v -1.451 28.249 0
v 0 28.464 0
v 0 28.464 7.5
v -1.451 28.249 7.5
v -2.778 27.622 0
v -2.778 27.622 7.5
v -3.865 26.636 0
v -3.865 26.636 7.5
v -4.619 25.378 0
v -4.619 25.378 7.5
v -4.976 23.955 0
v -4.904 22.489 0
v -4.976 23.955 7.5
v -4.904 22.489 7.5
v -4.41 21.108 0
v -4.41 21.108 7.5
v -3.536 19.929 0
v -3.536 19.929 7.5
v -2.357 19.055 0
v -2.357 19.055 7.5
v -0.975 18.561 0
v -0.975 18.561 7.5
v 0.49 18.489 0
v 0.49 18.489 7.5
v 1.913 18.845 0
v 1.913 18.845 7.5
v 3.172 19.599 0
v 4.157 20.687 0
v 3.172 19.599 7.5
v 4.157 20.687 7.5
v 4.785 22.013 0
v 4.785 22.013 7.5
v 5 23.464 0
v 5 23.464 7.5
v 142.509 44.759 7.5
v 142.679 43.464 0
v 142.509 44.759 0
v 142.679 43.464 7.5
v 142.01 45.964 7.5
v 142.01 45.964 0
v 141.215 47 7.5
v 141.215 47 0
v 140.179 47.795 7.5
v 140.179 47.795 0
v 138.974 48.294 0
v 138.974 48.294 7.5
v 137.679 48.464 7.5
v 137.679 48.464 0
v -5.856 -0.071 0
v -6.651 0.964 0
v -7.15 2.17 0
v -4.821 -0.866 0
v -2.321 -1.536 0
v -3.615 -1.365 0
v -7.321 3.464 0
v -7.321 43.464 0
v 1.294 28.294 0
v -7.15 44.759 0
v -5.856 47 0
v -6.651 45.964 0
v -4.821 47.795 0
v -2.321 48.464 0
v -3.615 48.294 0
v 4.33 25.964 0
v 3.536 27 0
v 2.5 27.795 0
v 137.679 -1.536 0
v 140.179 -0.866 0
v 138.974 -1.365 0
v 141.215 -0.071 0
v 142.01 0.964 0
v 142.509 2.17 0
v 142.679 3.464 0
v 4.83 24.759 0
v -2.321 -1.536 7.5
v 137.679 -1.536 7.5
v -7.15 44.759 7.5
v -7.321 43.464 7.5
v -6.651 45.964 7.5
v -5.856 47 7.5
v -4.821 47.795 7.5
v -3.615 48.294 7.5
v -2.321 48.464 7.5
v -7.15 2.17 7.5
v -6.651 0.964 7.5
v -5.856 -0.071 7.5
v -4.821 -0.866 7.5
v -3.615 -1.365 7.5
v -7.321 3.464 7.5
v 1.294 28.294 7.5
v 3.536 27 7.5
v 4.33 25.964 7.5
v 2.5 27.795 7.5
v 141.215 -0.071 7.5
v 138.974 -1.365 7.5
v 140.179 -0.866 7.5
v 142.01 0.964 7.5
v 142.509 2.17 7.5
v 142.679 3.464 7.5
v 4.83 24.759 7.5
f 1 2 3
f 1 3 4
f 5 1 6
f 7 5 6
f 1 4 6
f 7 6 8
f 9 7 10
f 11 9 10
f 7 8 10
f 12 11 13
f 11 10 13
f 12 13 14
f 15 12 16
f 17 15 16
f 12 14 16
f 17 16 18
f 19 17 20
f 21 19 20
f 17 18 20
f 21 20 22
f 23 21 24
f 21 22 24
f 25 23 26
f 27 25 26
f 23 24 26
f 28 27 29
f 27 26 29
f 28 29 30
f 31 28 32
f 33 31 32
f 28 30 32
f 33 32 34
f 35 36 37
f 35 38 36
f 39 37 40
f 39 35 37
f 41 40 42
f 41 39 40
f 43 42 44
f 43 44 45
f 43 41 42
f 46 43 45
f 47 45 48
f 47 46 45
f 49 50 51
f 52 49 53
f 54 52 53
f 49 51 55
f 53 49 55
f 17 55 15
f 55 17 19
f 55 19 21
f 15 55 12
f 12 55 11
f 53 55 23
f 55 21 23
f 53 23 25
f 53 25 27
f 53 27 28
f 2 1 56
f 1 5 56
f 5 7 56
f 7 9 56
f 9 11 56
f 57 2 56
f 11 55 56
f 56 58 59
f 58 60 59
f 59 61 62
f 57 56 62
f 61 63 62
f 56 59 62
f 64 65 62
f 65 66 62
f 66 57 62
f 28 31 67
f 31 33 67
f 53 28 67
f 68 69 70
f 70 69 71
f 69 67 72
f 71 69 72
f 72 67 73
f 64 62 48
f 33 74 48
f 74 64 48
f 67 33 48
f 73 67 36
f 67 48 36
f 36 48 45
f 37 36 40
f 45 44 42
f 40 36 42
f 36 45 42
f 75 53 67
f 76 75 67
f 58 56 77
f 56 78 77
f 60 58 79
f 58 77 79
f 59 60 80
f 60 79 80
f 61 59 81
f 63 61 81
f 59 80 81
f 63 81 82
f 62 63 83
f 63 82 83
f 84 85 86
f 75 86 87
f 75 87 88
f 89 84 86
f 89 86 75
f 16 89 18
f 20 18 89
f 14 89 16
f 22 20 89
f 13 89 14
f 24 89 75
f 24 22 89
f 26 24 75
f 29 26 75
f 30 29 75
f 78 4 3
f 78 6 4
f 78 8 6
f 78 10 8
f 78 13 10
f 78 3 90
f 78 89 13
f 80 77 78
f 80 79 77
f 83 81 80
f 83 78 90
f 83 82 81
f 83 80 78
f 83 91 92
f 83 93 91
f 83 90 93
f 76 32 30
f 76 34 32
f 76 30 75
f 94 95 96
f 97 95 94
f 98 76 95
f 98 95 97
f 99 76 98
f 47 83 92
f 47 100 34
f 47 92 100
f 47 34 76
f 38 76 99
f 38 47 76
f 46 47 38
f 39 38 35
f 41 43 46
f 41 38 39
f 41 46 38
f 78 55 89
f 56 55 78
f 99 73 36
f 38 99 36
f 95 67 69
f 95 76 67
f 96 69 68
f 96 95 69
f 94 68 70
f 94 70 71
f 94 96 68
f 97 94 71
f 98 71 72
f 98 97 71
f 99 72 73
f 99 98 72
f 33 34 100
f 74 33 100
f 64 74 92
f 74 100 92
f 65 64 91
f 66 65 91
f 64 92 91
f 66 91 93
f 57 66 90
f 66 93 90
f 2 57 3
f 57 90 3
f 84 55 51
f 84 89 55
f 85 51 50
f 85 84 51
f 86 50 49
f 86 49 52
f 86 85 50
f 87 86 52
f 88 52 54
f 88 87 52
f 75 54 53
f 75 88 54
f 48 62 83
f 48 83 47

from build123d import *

# Parameters (mm, degrees)
F0_W     = 150
F0_H     = 50
F1_DEPTH = 7.5
F2_R     = 5
F3_R     = 5
F4_R     = 5
F5_R     = 5
F7_DEPTH = 25


with BuildPart() as f1:
    # F0 (on Top) → F1 (new body)
    with BuildSketch(Plane.XY):
        with Locations((67.679448, 23.464493)):
            Rectangle(F0_W, F0_H)
    extrude(amount=F1_DEPTH)

    # F2
    f2_edges = [f1.edges().sort_by_distance(p)[0] for p in [
        (-7.320552, -1.535507, 3.75),
    ]]
    fillet(f2_edges, radius=F2_R)

    # F3
    f3_edges = [f1.edges().sort_by_distance(p)[0] for p in [
        (-7.320552, 48.464493, 3.75),
    ]]
    fillet(f3_edges, radius=F3_R)

    # F4
    f4_edges = [f1.edges().sort_by_distance(p)[0] for p in [
        (142.679448, -1.535507, 3.75),
    ]]
    fillet(f4_edges, radius=F4_R)

    # F5
    f5_edges = [f1.edges().sort_by_distance(p)[0] for p in [
        (142.679448, 48.464493, 3.75),
    ]]
    fillet(f5_edges, radius=F5_R)

    # F6 (on face) → F7 (cut)
    with BuildSketch(Plane.XY.offset(7.5)):
        with BuildLine():
            ThreePointArc((0, 28.464493), (-3.535534, 19.928959), (5, 23.464493))
            ThreePointArc((5, 23.464493), (3.535534, 27.000027), (0, 28.464493))
        make_face()
    extrude(amount=-F7_DEPTH, mode=Mode.SUBTRACT)


solid = f1.part
